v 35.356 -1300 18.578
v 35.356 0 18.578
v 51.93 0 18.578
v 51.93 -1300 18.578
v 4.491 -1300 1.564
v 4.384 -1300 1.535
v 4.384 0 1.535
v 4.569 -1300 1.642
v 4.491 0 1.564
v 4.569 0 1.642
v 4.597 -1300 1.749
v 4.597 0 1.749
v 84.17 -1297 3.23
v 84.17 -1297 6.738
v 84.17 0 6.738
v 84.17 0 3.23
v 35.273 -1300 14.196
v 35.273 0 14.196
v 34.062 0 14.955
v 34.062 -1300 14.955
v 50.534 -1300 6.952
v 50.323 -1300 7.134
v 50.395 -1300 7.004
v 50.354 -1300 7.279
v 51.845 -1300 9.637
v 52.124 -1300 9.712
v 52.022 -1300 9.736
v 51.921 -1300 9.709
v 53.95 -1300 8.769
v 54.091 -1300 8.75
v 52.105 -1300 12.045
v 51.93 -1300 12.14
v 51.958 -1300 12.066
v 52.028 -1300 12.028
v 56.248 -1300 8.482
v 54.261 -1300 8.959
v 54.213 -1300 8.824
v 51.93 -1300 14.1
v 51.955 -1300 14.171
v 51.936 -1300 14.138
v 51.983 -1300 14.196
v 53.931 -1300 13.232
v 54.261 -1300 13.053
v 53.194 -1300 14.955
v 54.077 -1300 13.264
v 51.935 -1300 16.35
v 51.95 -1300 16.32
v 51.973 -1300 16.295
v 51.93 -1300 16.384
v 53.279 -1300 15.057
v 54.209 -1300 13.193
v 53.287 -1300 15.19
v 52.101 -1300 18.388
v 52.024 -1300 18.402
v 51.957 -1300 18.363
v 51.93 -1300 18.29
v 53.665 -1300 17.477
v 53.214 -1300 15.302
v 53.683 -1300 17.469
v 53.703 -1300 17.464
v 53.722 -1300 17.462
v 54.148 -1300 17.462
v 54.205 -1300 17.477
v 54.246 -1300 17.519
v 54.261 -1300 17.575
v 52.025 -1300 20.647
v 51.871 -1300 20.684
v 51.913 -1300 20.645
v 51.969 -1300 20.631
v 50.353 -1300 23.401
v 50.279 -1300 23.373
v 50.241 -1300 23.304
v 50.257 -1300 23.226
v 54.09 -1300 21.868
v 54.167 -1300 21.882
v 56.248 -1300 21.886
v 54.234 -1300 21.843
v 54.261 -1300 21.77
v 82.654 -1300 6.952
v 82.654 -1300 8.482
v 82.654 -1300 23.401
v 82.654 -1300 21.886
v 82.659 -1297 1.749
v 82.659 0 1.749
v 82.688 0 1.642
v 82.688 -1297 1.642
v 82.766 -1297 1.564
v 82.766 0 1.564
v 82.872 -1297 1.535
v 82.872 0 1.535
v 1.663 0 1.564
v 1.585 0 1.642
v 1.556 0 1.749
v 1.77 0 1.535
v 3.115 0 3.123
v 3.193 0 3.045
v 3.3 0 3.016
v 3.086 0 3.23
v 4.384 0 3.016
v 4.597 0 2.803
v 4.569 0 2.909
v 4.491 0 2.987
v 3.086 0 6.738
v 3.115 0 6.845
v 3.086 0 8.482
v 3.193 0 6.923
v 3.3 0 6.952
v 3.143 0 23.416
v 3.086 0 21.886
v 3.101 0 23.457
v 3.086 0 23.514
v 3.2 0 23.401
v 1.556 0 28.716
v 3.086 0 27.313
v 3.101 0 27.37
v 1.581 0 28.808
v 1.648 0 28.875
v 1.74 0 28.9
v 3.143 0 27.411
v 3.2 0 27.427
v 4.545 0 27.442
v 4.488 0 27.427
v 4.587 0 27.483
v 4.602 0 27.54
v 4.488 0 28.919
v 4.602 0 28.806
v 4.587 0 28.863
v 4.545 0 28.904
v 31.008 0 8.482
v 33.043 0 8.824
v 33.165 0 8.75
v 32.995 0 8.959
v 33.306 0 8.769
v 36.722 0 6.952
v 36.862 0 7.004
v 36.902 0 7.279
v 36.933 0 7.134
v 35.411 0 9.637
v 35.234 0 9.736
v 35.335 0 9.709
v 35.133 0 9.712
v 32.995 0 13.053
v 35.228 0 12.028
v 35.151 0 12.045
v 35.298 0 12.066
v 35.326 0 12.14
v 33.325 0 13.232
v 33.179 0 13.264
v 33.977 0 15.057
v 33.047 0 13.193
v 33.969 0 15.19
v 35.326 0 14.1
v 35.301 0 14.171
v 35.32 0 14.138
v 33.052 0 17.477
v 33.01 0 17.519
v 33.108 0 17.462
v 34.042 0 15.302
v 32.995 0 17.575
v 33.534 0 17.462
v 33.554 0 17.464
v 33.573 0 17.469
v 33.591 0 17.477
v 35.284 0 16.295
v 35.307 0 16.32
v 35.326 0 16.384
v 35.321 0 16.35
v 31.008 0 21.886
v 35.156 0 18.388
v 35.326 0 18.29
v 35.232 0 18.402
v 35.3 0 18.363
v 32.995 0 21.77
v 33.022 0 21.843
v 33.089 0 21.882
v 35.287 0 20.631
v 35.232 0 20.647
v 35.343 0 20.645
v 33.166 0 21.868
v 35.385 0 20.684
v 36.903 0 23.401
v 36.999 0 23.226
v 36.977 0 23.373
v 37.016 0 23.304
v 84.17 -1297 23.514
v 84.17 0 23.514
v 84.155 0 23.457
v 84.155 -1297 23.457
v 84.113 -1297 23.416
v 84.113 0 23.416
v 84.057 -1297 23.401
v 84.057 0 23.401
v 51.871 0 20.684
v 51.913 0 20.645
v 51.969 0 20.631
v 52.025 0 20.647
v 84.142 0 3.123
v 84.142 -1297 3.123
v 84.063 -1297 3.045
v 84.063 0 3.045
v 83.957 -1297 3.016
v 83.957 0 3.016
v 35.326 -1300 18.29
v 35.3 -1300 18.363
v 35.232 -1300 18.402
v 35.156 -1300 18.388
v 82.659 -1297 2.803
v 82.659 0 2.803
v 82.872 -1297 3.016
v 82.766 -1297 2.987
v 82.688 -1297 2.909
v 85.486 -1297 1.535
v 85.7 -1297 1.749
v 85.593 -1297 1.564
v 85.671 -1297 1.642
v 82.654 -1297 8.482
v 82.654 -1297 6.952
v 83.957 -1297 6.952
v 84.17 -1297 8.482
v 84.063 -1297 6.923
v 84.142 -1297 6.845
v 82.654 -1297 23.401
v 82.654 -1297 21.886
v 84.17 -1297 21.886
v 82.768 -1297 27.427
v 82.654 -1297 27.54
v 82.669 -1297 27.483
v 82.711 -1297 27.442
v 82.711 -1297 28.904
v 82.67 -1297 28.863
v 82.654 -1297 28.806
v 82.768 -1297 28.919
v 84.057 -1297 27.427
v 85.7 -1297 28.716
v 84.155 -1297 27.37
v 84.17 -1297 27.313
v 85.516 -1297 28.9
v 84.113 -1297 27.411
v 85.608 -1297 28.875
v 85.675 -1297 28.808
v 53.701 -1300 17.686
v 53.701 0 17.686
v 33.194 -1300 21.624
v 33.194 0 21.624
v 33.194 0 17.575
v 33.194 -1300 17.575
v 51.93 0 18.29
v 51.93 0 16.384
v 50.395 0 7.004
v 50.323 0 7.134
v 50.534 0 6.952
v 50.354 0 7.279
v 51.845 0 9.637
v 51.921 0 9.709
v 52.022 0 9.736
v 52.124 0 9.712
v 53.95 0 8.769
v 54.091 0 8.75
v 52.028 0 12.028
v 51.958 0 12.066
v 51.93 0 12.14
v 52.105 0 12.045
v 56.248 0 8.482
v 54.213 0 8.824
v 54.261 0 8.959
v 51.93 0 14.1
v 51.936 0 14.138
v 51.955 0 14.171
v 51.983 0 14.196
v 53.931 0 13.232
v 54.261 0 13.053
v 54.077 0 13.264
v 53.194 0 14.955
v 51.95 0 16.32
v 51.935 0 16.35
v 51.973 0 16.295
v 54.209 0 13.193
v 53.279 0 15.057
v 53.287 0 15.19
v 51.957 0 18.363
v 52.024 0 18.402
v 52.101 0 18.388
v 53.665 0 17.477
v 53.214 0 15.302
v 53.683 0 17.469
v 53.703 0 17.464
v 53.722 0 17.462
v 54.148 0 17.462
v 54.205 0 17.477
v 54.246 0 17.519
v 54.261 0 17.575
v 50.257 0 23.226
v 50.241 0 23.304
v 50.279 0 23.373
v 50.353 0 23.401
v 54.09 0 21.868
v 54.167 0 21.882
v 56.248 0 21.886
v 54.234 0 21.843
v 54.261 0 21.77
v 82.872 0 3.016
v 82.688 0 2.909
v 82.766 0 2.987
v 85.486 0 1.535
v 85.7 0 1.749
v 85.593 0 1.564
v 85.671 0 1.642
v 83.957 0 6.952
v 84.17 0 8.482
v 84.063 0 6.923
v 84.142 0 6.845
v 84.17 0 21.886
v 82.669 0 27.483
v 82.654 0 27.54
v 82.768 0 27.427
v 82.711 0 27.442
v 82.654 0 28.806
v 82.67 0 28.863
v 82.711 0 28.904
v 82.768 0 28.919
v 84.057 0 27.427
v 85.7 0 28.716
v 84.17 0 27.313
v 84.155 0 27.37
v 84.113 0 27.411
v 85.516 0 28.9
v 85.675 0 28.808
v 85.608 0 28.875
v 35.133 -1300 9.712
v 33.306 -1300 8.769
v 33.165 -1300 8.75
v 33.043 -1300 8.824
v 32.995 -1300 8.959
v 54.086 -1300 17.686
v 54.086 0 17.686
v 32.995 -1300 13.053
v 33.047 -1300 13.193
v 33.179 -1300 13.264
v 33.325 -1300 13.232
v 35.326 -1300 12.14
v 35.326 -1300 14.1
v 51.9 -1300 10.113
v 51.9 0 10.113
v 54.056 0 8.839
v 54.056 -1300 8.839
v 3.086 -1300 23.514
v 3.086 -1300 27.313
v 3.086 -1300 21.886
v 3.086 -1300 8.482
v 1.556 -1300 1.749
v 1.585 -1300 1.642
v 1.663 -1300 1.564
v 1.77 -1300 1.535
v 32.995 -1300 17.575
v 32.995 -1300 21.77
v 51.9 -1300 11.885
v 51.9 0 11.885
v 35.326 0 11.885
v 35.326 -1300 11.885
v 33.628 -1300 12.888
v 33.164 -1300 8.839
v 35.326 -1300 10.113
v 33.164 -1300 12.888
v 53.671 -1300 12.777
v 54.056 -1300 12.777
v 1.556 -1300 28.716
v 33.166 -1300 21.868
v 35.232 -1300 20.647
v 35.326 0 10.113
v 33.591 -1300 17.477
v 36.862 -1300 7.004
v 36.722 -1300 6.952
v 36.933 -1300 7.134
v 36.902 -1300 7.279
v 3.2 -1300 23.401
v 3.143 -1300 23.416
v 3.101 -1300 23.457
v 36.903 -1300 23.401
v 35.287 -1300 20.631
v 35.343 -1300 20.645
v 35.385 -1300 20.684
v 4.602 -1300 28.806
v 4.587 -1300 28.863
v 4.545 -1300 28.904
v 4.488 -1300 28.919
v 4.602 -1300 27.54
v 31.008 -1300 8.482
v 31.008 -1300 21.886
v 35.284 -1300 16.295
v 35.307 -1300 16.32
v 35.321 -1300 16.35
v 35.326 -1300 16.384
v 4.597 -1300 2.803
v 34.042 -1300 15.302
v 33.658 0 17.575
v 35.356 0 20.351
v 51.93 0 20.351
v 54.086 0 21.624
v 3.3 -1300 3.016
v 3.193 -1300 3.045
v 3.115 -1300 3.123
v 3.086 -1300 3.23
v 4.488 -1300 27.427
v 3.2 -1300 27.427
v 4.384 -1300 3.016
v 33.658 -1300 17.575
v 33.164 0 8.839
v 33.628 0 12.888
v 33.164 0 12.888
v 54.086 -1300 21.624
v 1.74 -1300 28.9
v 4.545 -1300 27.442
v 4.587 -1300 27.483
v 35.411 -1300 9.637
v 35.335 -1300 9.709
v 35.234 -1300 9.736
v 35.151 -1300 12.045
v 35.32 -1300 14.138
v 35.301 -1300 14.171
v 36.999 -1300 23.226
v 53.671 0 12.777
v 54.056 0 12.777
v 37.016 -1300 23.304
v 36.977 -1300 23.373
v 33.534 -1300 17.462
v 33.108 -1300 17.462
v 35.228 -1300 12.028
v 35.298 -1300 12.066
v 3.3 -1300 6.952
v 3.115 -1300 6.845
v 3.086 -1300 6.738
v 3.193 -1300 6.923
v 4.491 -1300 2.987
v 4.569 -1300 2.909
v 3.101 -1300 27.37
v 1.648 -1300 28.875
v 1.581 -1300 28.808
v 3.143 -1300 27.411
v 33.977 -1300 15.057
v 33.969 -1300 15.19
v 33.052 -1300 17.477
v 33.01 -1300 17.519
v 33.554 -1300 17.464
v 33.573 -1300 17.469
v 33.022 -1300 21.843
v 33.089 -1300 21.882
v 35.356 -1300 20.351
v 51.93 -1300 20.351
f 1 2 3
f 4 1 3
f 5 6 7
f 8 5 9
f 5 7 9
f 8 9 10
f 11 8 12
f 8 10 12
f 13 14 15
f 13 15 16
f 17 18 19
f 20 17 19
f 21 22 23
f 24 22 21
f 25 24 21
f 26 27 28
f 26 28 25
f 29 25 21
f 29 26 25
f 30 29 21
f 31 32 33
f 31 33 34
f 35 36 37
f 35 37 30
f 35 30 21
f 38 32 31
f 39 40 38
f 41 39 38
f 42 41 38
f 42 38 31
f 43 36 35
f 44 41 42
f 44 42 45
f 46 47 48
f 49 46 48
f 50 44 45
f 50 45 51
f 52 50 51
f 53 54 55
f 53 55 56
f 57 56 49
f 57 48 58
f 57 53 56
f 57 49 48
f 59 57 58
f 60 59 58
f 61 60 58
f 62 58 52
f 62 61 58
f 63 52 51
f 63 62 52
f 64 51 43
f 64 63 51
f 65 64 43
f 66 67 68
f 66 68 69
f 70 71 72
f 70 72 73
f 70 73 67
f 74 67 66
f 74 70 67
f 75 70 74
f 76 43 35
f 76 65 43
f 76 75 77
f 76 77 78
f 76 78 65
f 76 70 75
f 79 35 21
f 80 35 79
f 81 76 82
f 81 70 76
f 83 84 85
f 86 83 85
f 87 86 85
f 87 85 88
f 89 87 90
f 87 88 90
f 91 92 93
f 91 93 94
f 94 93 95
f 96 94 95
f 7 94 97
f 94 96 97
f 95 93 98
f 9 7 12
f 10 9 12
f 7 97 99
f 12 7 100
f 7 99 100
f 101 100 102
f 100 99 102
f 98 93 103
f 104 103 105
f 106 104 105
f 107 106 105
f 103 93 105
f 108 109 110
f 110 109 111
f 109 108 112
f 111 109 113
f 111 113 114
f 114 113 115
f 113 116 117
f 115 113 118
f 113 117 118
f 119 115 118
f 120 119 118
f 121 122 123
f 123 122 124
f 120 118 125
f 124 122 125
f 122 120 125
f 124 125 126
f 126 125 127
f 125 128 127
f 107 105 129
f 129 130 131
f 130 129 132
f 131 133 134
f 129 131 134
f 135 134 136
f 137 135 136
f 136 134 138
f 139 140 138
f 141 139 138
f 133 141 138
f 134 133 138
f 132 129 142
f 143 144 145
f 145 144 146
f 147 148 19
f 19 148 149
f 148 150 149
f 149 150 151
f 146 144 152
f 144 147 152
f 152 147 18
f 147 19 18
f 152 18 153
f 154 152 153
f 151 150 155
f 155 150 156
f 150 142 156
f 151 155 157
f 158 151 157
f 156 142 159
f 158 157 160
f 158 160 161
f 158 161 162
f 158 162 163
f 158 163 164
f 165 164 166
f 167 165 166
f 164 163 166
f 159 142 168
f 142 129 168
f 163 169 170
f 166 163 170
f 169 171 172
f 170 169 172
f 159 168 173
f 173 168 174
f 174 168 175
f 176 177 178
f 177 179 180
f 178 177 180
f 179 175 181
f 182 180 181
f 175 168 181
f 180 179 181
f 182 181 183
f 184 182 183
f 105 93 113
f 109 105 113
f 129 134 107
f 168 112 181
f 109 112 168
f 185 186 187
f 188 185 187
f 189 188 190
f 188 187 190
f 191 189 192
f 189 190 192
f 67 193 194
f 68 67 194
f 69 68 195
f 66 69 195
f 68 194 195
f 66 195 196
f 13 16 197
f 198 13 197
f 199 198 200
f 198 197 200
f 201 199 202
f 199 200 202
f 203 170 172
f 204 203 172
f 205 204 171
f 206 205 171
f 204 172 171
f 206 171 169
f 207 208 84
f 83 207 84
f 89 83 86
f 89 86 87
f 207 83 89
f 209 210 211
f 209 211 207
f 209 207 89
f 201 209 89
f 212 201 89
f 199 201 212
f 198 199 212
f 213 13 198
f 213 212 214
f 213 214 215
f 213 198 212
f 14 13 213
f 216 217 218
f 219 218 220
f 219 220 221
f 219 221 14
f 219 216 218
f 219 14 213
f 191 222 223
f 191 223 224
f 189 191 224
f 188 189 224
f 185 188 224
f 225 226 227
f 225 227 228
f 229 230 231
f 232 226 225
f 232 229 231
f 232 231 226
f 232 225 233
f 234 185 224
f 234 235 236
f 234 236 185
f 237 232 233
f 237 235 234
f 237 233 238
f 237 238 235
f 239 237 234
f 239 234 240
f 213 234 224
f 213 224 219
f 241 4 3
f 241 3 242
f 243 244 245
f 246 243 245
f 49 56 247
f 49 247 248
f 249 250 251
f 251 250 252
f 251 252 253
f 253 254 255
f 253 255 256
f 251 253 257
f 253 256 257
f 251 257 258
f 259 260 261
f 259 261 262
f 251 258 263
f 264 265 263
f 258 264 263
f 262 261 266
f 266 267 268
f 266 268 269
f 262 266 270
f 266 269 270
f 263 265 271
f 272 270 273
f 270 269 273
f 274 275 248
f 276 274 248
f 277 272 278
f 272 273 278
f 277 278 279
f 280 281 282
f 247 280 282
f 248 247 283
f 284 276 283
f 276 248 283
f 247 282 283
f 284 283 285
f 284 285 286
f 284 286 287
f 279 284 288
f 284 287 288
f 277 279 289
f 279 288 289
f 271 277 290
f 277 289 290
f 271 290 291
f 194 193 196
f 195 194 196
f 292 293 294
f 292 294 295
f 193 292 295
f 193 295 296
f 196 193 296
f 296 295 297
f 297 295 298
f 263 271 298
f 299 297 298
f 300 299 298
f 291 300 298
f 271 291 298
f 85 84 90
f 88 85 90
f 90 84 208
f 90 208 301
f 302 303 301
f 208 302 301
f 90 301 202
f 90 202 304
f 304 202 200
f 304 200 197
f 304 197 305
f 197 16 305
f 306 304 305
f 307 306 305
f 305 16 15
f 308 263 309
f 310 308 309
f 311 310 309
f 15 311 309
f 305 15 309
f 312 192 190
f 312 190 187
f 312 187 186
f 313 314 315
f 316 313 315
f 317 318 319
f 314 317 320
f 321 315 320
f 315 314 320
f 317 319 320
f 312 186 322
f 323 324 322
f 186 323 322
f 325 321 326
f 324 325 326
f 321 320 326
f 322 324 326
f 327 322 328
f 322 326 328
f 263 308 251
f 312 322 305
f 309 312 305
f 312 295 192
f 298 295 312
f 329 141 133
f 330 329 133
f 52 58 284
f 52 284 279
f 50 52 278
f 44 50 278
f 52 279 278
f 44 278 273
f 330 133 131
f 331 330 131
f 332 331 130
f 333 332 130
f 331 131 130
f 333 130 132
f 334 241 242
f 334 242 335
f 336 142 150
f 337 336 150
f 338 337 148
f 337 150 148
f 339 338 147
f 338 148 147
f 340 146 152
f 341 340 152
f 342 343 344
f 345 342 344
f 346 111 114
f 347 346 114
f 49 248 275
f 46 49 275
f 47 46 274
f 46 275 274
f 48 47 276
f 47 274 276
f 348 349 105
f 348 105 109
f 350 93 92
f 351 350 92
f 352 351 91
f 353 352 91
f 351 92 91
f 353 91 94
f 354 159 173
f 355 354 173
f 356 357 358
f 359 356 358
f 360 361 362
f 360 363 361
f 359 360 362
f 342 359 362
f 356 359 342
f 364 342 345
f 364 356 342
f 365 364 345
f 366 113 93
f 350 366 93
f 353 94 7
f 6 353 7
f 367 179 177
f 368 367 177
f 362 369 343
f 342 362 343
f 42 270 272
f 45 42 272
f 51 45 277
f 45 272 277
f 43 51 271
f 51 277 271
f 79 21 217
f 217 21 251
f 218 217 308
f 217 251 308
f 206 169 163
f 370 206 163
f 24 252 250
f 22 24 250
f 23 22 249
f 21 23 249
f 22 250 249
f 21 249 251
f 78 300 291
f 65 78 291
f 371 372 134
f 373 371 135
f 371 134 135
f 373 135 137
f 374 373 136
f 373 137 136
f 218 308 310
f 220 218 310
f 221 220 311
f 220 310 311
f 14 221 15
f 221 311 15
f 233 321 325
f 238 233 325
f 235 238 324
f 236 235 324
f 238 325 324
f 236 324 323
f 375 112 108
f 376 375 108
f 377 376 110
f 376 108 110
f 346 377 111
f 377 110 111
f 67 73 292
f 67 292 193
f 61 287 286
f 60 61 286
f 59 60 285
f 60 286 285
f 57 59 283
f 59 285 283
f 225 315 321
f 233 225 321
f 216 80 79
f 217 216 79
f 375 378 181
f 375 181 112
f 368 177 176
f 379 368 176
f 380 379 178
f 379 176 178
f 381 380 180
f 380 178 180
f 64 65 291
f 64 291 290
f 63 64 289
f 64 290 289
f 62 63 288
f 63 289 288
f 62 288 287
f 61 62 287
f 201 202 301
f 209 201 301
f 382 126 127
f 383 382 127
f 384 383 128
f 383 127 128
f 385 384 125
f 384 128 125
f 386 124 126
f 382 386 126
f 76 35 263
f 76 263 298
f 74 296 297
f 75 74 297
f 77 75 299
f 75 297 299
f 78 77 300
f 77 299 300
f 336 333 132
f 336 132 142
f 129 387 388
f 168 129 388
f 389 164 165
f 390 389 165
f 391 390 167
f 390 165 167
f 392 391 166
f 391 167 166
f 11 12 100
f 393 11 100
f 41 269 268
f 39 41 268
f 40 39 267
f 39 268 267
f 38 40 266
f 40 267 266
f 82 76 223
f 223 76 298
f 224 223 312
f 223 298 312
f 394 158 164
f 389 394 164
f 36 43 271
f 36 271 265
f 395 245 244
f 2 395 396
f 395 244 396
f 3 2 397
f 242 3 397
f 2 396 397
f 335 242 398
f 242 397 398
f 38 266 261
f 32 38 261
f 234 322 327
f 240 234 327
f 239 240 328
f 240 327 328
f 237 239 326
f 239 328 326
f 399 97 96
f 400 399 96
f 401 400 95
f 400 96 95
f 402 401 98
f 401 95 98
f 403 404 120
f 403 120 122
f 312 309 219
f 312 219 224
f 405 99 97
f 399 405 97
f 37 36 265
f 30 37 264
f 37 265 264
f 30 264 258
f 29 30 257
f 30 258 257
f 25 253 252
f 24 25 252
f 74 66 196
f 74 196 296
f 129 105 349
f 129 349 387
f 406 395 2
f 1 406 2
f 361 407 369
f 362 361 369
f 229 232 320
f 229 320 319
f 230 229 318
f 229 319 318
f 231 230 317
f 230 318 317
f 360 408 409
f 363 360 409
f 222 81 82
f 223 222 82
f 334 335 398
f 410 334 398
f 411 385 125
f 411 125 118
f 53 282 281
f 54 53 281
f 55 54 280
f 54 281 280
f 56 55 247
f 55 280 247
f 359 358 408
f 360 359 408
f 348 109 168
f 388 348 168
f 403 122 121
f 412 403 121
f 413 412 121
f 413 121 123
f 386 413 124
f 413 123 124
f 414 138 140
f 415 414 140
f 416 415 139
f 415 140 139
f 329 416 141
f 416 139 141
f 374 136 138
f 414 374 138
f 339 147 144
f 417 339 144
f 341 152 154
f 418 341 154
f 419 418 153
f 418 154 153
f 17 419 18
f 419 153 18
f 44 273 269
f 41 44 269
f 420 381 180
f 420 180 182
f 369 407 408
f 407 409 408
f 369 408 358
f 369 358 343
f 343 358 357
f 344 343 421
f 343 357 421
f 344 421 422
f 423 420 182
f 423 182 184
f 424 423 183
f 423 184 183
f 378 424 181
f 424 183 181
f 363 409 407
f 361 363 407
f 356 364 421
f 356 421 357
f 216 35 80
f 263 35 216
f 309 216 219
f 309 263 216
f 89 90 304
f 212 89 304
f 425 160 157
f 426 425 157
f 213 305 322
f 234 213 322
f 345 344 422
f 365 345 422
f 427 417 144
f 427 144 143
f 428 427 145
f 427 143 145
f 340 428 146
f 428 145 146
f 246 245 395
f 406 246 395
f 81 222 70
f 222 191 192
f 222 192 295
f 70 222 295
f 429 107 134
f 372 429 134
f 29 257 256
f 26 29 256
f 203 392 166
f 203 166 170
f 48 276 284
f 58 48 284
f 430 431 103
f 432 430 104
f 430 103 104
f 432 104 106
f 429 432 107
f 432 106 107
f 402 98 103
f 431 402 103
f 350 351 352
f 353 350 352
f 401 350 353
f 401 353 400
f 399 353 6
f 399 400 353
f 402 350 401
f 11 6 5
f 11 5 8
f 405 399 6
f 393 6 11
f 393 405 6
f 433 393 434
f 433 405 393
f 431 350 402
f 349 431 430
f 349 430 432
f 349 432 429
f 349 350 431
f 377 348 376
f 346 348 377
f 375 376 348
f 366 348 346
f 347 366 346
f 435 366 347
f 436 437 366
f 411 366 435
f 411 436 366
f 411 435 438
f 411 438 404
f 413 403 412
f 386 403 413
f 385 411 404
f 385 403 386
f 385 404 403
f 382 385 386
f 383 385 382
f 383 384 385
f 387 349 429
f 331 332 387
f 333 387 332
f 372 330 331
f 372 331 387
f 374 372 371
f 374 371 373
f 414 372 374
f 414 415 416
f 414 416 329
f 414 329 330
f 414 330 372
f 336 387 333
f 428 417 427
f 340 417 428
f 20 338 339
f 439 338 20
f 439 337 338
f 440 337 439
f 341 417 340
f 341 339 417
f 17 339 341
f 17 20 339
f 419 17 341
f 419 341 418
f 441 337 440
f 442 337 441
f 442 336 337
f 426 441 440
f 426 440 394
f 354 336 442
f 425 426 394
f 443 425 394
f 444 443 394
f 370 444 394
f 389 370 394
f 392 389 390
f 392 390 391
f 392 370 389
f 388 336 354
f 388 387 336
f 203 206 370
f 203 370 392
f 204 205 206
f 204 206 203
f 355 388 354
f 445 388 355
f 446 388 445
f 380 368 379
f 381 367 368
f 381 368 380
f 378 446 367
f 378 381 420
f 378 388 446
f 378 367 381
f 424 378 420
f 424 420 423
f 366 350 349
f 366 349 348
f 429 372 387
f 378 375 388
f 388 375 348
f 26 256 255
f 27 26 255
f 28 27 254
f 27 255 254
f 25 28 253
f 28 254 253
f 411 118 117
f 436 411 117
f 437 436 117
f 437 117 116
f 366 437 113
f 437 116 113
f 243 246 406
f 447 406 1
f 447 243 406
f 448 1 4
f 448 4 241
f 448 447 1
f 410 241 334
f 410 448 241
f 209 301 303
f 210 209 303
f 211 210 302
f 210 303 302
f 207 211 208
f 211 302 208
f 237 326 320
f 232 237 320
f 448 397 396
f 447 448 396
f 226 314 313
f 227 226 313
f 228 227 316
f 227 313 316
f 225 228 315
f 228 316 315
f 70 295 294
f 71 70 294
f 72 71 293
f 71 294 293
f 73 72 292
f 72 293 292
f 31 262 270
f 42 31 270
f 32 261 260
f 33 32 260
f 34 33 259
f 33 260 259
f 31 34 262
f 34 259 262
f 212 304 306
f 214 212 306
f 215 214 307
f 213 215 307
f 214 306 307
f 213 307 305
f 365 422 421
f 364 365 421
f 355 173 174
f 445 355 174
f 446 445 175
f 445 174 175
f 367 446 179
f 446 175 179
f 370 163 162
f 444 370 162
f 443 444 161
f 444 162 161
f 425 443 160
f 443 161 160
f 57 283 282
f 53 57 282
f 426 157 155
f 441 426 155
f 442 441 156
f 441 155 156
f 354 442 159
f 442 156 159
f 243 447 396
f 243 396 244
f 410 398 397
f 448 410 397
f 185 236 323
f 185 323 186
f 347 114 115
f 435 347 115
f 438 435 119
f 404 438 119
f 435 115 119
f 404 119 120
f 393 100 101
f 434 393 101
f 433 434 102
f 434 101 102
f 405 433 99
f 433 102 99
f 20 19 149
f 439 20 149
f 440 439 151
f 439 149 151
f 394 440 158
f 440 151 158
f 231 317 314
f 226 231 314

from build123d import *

# Parameters (mm, degrees)
F1_DEPTH = 1300
F0_W     = 27.9218892101
F0_H     = 13.4031483904
F3_DEPTH = 3


with BuildPart() as f1:
    # F0 (on Front) → F1 (new body)
    with BuildSketch(Plane.XZ):
        Polygon((33.1643968821, 8.8389720768), (35.3255756199, 10.1125258952), (51.900004968, 10.1125258952), (54.0555718382, 8.8389720768), (54.0555718382, 12.7773806453), (53.6706149578, 12.7773806453), (51.900004968, 11.8849426508), (35.3255756199, 11.8849426508), (33.6281075799, 12.8878421359), (33.1643968821, 12.8878421359), align=None)
    extrude(amount=F1_DEPTH)


with BuildPart() as f1b:
    # F0 (on Front) → F1, piece 2 (new body)
    with BuildSketch(Plane.XZ):
        with BuildLine():
            ThreePointArc((1.7400689467, 28.9004424067), (1.610154442, 28.8458538917), (1.5564486384, 28.7155720005))
            Line((1.5564486384, 28.7155720005), (1.5564486384, 1.7487789137))
            ThreePointArc((1.5564486384, 1.7487789137), (1.6189816628, 1.5978108381), (1.7699497384, 1.5352778137))
            Line((1.7699497384, 1.5352778137), (4.3837734866, 1.5352778137))
            ThreePointArc((4.3837734866, 1.5352778137), (4.5347415622, 1.5978108381), (4.5972745866, 1.7487789137))
            Line((4.5972745866, 1.7487789137), (4.5972745866, 2.8025670345))
            ThreePointArc((4.5972745866, 2.8025670345), (4.5347415622, 2.9535351101), (4.3837734866, 3.0160681345))
            Line((4.3837734866, 3.0160681345), (3.2995220372, 3.0160681345))
            ThreePointArc((3.2995220372, 3.0160681345), (3.1485539616, 3.0786011589), (3.0860209372, 3.2295692345))
            Line((3.0860209372, 3.2295692345), (3.0860209372, 6.73822727))
            ThreePointArc((3.0860209372, 6.73822727), (3.1485539616, 6.8891953456), (3.2995220372, 6.95172837))
            Line((3.2995220372, 6.95172837), (36.7220732833, 6.95172837))
            ThreePointArc((36.7220732833, 6.95172837), (36.909094242, 7.0622446134), (36.9024969591, 7.2793785695))
            Line((36.9024969591, 7.2793785695), (35.4109538688, 9.6369064715))
            ThreePointArc((35.4109538688, 9.6369064715), (35.2864431086, 9.7288070398), (35.1325563369, 9.7124514501))
            Line((35.1325563369, 9.7124514501), (33.3064083824, 8.7692762138))
            ThreePointArc((33.3064083824, 8.7692762138), (33.0973823007, 8.7766241296), (32.9949334264, 8.9589702918))
            Line((32.9949334264, 8.9589702918), (32.9949334264, 13.052558215))
            ThreePointArc((32.9949334264, 13.052558215), (33.1065923516, 13.2402038682), (33.3247761404, 13.2315759475))
            Line((33.3247761404, 13.2315759475), (35.1508547592, 12.0448279597))
            ThreePointArc((35.1508547592, 12.0448279597), (35.266845262, 12.0402411989), (35.326205194, 12.1399970688))
            Line((35.326205194, 12.1399970688), (35.326205194, 14.1000744849))
            ThreePointArc((35.326205194, 14.1000744849), (35.3120005783, 14.1550536436), (35.2729421347, 14.1962715644))
            Line((35.2729421347, 14.1962715644), (34.0620617039, 14.954517704))
            ThreePointArc((34.0620617039, 14.954517704), (33.9622249211, 15.1231859929), (34.0420253617, 15.3022062838))
            Line((34.0420253617, 15.3022062838), (35.2835938216, 16.2951429765))
            ThreePointArc((35.2835938216, 16.2951429765), (35.3149991617, 16.334608133), (35.326205194, 16.3837835213))
            Line((35.326205194, 16.3837835213), (35.326205194, 18.2900932618))
            ThreePointArc((35.326205194, 18.2900932618), (35.2692768061, 18.3884905579), (35.1555984257, 18.3881822121))
            Line((35.1555984257, 18.3881822121), (33.5908916097, 17.4772373113))
            ThreePointArc((33.5908916097, 17.4772373113), (33.5633603883, 17.4657459183), (33.5337859409, 17.4618251622))
            Line((33.5337859409, 17.4618251622), (33.1084345259, 17.4618251622))
            ThreePointArc((33.1084345259, 17.4618251622), (33.0281771288, 17.4950688645), (32.9949334264, 17.5753262617))
            Line((32.9949334264, 17.5753262617), (32.9949334264, 21.7697896372))
            ThreePointArc((32.9949334264, 21.7697896372), (33.0521783263, 21.8683682333), (33.1661694697, 21.8675095219))
            Line((33.1661694697, 21.8675095219), (35.2315651953, 20.6472306944))
            ThreePointArc((35.2315651953, 20.6472306944), (35.3158103776, 20.6345888698), (35.3851216132, 20.6841168326))
            Line((35.3851216132, 20.6841168326), (36.9991130564, 23.2263741871))
            ThreePointArc((36.9991130564, 23.2263741871), (37.0027581513, 23.341878778), (36.9032915823, 23.400709033))
            Line((36.9032915823, 23.400709033), (3.1995220367, 23.400709033))
            ThreePointArc((3.1995220367, 23.400709033), (3.1192646396, 23.4339527354), (3.0860209372, 23.5142101325))
            Line((3.0860209372, 23.5142101325), (3.0860209372, 27.3130099498))
            ThreePointArc((3.0860209372, 27.3130099498), (3.1192646396, 27.3932673469), (3.1995220367, 27.4265110493))
            Line((3.1995220367, 27.4265110493), (4.4884980865, 27.4265110493))
            ThreePointArc((4.4884980865, 27.4265110493), (4.5687554836, 27.4597547517), (4.601999186, 27.5400121488))
            Line((4.601999186, 27.5400121488), (4.601999186, 28.8055868989))
            ThreePointArc((4.601999186, 28.8055868989), (4.5684827516, 28.8861161044), (4.4877279946, 28.9190853859))
            Line((4.4877279946, 28.9190853859), (1.7400689467, 28.9004424067))
        make_face()
        with Locations((17.0469655422, 15.1840499602)):
            Rectangle(F0_W, F0_H, mode=Mode.SUBTRACT)
    extrude(amount=F1_DEPTH)


with BuildPart() as f1c:
    # F0 (on Front) → F1, piece 3 (new body)
    with BuildSketch(Plane.XZ):
        with BuildLine():
            Line((54.1477753989, 17.4618251622), (53.7224239839, 17.4618251622))
            ThreePointArc((53.7224239839, 17.4618251622), (53.6928495365, 17.4657459183), (53.6653183151, 17.4772373113))
            Line((53.6653183151, 17.4772373113), (52.1006114991, 18.3881822121))
            ThreePointArc((52.1006114991, 18.3881822121), (51.9869331187, 18.3884905579), (51.9300047308, 18.2900932618))
            Line((51.9300047308, 18.2900932618), (51.9300047308, 16.3837835213))
            ThreePointArc((51.9300047308, 16.3837835213), (51.9412107631, 16.334608133), (51.9726161032, 16.2951429765))
            Line((51.9726161032, 16.2951429765), (53.2141845631, 15.3022062838))
            ThreePointArc((53.2141845631, 15.3022062838), (53.2939850037, 15.1231859929), (53.1941482209, 14.954517704))
            Line((53.1941482209, 14.954517704), (51.9832677901, 14.1962715644))
            ThreePointArc((51.9832677901, 14.1962715644), (51.9442093465, 14.1550536436), (51.9300047308, 14.1000744849))
            Line((51.9300047308, 14.1000744849), (51.9300047308, 12.1399970688))
            ThreePointArc((51.9300047308, 12.1399970688), (51.9893646628, 12.0402411989), (52.1053551656, 12.0448279597))
            Line((52.1053551656, 12.0448279597), (53.9314337844, 13.2315759475))
            ThreePointArc((53.9314337844, 13.2315759475), (54.1496175732, 13.2402038682), (54.2612764984, 13.052558215))
            Line((54.2612764984, 13.052558215), (54.2612764984, 8.9589702918))
            ThreePointArc((54.2612764984, 8.9589702918), (54.1588276241, 8.7766241296), (53.9498015424, 8.7692762138))
            Line((53.9498015424, 8.7692762138), (52.1236535879, 9.7124514501))
            ThreePointArc((52.1236535879, 9.7124514501), (51.9697668162, 9.7288070398), (51.845256056, 9.6369064715))
            Line((51.845256056, 9.6369064715), (50.3537129657, 7.2793785695))
            ThreePointArc((50.3537129657, 7.2793785695), (50.3471156828, 7.0622446134), (50.5341366415, 6.95172837))
            Line((50.5341366415, 6.95172837), (83.9566878876, 6.95172837))
            ThreePointArc((83.9566878876, 6.95172837), (84.1076559632, 6.8891953456), (84.1701889876, 6.73822727))
            Line((84.1701889876, 6.73822727), (84.1701889876, 3.2295692345))
            ThreePointArc((84.1701889876, 3.2295692345), (84.1076559632, 3.0786011589), (83.9566878876, 3.0160681345))
            Line((83.9566878876, 3.0160681345), (82.8724364383, 3.0160681345))
            ThreePointArc((82.8724364383, 3.0160681345), (82.7214683627, 2.9535351101), (82.6589353383, 2.8025670345))
            Line((82.6589353383, 2.8025670345), (82.6589353383, 1.7487789137))
            ThreePointArc((82.6589353383, 1.7487789137), (82.7214683627, 1.5978108381), (82.8724364383, 1.5352778137))
            Line((82.8724364383, 1.5352778137), (85.4862601864, 1.5352778137))
            ThreePointArc((85.4862601864, 1.5352778137), (85.637228262, 1.5978108381), (85.6997612864, 1.7487789137))
            Line((85.6997612864, 1.7487789137), (85.6997612864, 28.7155720005))
            ThreePointArc((85.6997612864, 28.7155720005), (85.6460554828, 28.8458538917), (85.5161409781, 28.9004424067))
            Line((85.5161409781, 28.9004424067), (82.7684819302, 28.9190853859))
            ThreePointArc((82.7684819302, 28.9190853859), (82.6877271732, 28.8861161044), (82.6542107388, 28.8055868989))
            Line((82.6542107388, 28.8055868989), (82.6542107388, 27.5400121488))
            ThreePointArc((82.6542107388, 27.5400121488), (82.6874544412, 27.4597547516), (82.7677118384, 27.4265110493))
            Line((82.7677118384, 27.4265110493), (84.0566878881, 27.4265110493))
            ThreePointArc((84.0566878881, 27.4265110493), (84.1369452853, 27.3932673469), (84.1701889876, 27.3130099498))
            Line((84.1701889876, 27.3130099498), (84.1701889876, 23.5142101325))
            ThreePointArc((84.1701889876, 23.5142101325), (84.1369452853, 23.4339527354), (84.0566878881, 23.400709033))
            Line((84.0566878881, 23.400709033), (50.3529183425, 23.400709033))
            ThreePointArc((50.3529183425, 23.400709033), (50.2534517735, 23.341878778), (50.2570968685, 23.2263741871))
            Line((50.2570968685, 23.2263741871), (51.8710883117, 20.6841168326))
            ThreePointArc((51.8710883117, 20.6841168326), (51.9403995472, 20.6345888698), (52.0246447296, 20.6472306944))
            Line((52.0246447296, 20.6472306944), (54.0900404551, 21.8675095219))
            ThreePointArc((54.0900404551, 21.8675095219), (54.2040315985, 21.8683682333), (54.2612764984, 21.7697896372))
            Line((54.2612764984, 21.7697896372), (54.2612764984, 17.5753262617))
            ThreePointArc((54.2612764984, 17.5753262617), (54.2280327961, 17.4950688645), (54.1477753989, 17.4618251622))
        make_face()
        with Locations((70.2092443826, 15.1840499602)):
            Rectangle(F0_W, F0_H, mode=Mode.SUBTRACT)
    extrude(amount=F1_DEPTH)

    # F2 (on face) → F3 (cut)
    with BuildSketch(Plane.XZ.offset(1300)):
        with BuildLine():
            Line((84.0566878881, 23.400709033), (82.6542107388, 23.400709033))
            Line((82.6542107388, 23.400709033), (82.6542107388, 21.8856241554))
            Line((82.6542107388, 21.8856241554), (84.1701889876, 21.8856241554))
            Line((84.1701889876, 21.8856241554), (84.1701889876, 8.482475765))
            Line((84.1701889876, 8.482475765), (82.6542107388, 8.482475765))
            Line((82.6542107388, 8.482475765), (82.6542107388, 6.95172837))
            Line((82.6542107388, 6.95172837), (83.9566878876, 6.95172837))
            ThreePointArc((83.9566878876, 6.95172837), (84.1076559632, 6.8891953456), (84.1701889876, 6.73822727))
            Line((84.1701889876, 6.73822727), (84.1701889876, 3.2295692345))
            ThreePointArc((84.1701889876, 3.2295692345), (84.1076559632, 3.0786011589), (83.9566878876, 3.0160681345))
            Line((83.9566878876, 3.0160681345), (82.8724364383, 3.0160681345))
            ThreePointArc((82.8724364383, 3.0160681345), (82.7214683627, 2.9535351101), (82.6589353383, 2.8025670345))
            Line((82.6589353383, 2.8025670345), (82.6589353383, 1.7487789137))
            ThreePointArc((82.6589353383, 1.7487789137), (82.7214683627, 1.5978108381), (82.8724364383, 1.5352778137))
            Line((82.8724364383, 1.5352778137), (85.4862601864, 1.5352778137))
            ThreePointArc((85.4862601864, 1.5352778137), (85.637228262, 1.5978108381), (85.6997612864, 1.7487789137))
            Line((85.6997612864, 1.7487789137), (85.6997612864, 28.7155720005))
            ThreePointArc((85.6997612864, 28.7155720005), (85.6460554828, 28.8458538917), (85.5161409781, 28.9004424067))
            Line((85.5161409781, 28.9004424067), (82.7684819302, 28.9190853859))
            ThreePointArc((82.7684819302, 28.9190853859), (82.6877271732, 28.8861161044), (82.6542107388, 28.8055868989))
            Line((82.6542107388, 28.8055868989), (82.6542107388, 27.5400121488))
            ThreePointArc((82.6542107388, 27.5400121488), (82.6874544412, 27.4597547516), (82.7677118384, 27.4265110493))
            Line((82.7677118384, 27.4265110493), (84.0566878881, 27.4265110493))
            ThreePointArc((84.0566878881, 27.4265110493), (84.1369452853, 27.3932673469), (84.1701889876, 27.3130099498))
            Line((84.1701889876, 27.3130099498), (84.1701889876, 23.5142101325))
            ThreePointArc((84.1701889876, 23.5142101325), (84.1369452853, 23.4339527354), (84.0566878881, 23.400709033))
        make_face()
    extrude(amount=-F3_DEPTH, mode=Mode.SUBTRACT)


with BuildPart() as f1d:
    # F0 (on Front) → F1, piece 4 (new body)
    with BuildSketch(Plane.XZ):
        Polygon((35.3555753827, 20.3506425023), (33.1943966448, 21.6241963208), (33.1943966448, 17.5753262617), (33.6581073427, 17.5753262617), (35.3555753827, 18.5782257468), (51.9300047308, 18.5782257468), (53.7006147206, 17.6857877523), (54.0855716009, 17.6857877523), (54.0855716009, 21.6241963208), (51.9300047308, 20.3506425023), align=None)
    extrude(amount=F1_DEPTH)


solid = Compound([f1.part, f1b.part, f1c.part, f1d.part])
